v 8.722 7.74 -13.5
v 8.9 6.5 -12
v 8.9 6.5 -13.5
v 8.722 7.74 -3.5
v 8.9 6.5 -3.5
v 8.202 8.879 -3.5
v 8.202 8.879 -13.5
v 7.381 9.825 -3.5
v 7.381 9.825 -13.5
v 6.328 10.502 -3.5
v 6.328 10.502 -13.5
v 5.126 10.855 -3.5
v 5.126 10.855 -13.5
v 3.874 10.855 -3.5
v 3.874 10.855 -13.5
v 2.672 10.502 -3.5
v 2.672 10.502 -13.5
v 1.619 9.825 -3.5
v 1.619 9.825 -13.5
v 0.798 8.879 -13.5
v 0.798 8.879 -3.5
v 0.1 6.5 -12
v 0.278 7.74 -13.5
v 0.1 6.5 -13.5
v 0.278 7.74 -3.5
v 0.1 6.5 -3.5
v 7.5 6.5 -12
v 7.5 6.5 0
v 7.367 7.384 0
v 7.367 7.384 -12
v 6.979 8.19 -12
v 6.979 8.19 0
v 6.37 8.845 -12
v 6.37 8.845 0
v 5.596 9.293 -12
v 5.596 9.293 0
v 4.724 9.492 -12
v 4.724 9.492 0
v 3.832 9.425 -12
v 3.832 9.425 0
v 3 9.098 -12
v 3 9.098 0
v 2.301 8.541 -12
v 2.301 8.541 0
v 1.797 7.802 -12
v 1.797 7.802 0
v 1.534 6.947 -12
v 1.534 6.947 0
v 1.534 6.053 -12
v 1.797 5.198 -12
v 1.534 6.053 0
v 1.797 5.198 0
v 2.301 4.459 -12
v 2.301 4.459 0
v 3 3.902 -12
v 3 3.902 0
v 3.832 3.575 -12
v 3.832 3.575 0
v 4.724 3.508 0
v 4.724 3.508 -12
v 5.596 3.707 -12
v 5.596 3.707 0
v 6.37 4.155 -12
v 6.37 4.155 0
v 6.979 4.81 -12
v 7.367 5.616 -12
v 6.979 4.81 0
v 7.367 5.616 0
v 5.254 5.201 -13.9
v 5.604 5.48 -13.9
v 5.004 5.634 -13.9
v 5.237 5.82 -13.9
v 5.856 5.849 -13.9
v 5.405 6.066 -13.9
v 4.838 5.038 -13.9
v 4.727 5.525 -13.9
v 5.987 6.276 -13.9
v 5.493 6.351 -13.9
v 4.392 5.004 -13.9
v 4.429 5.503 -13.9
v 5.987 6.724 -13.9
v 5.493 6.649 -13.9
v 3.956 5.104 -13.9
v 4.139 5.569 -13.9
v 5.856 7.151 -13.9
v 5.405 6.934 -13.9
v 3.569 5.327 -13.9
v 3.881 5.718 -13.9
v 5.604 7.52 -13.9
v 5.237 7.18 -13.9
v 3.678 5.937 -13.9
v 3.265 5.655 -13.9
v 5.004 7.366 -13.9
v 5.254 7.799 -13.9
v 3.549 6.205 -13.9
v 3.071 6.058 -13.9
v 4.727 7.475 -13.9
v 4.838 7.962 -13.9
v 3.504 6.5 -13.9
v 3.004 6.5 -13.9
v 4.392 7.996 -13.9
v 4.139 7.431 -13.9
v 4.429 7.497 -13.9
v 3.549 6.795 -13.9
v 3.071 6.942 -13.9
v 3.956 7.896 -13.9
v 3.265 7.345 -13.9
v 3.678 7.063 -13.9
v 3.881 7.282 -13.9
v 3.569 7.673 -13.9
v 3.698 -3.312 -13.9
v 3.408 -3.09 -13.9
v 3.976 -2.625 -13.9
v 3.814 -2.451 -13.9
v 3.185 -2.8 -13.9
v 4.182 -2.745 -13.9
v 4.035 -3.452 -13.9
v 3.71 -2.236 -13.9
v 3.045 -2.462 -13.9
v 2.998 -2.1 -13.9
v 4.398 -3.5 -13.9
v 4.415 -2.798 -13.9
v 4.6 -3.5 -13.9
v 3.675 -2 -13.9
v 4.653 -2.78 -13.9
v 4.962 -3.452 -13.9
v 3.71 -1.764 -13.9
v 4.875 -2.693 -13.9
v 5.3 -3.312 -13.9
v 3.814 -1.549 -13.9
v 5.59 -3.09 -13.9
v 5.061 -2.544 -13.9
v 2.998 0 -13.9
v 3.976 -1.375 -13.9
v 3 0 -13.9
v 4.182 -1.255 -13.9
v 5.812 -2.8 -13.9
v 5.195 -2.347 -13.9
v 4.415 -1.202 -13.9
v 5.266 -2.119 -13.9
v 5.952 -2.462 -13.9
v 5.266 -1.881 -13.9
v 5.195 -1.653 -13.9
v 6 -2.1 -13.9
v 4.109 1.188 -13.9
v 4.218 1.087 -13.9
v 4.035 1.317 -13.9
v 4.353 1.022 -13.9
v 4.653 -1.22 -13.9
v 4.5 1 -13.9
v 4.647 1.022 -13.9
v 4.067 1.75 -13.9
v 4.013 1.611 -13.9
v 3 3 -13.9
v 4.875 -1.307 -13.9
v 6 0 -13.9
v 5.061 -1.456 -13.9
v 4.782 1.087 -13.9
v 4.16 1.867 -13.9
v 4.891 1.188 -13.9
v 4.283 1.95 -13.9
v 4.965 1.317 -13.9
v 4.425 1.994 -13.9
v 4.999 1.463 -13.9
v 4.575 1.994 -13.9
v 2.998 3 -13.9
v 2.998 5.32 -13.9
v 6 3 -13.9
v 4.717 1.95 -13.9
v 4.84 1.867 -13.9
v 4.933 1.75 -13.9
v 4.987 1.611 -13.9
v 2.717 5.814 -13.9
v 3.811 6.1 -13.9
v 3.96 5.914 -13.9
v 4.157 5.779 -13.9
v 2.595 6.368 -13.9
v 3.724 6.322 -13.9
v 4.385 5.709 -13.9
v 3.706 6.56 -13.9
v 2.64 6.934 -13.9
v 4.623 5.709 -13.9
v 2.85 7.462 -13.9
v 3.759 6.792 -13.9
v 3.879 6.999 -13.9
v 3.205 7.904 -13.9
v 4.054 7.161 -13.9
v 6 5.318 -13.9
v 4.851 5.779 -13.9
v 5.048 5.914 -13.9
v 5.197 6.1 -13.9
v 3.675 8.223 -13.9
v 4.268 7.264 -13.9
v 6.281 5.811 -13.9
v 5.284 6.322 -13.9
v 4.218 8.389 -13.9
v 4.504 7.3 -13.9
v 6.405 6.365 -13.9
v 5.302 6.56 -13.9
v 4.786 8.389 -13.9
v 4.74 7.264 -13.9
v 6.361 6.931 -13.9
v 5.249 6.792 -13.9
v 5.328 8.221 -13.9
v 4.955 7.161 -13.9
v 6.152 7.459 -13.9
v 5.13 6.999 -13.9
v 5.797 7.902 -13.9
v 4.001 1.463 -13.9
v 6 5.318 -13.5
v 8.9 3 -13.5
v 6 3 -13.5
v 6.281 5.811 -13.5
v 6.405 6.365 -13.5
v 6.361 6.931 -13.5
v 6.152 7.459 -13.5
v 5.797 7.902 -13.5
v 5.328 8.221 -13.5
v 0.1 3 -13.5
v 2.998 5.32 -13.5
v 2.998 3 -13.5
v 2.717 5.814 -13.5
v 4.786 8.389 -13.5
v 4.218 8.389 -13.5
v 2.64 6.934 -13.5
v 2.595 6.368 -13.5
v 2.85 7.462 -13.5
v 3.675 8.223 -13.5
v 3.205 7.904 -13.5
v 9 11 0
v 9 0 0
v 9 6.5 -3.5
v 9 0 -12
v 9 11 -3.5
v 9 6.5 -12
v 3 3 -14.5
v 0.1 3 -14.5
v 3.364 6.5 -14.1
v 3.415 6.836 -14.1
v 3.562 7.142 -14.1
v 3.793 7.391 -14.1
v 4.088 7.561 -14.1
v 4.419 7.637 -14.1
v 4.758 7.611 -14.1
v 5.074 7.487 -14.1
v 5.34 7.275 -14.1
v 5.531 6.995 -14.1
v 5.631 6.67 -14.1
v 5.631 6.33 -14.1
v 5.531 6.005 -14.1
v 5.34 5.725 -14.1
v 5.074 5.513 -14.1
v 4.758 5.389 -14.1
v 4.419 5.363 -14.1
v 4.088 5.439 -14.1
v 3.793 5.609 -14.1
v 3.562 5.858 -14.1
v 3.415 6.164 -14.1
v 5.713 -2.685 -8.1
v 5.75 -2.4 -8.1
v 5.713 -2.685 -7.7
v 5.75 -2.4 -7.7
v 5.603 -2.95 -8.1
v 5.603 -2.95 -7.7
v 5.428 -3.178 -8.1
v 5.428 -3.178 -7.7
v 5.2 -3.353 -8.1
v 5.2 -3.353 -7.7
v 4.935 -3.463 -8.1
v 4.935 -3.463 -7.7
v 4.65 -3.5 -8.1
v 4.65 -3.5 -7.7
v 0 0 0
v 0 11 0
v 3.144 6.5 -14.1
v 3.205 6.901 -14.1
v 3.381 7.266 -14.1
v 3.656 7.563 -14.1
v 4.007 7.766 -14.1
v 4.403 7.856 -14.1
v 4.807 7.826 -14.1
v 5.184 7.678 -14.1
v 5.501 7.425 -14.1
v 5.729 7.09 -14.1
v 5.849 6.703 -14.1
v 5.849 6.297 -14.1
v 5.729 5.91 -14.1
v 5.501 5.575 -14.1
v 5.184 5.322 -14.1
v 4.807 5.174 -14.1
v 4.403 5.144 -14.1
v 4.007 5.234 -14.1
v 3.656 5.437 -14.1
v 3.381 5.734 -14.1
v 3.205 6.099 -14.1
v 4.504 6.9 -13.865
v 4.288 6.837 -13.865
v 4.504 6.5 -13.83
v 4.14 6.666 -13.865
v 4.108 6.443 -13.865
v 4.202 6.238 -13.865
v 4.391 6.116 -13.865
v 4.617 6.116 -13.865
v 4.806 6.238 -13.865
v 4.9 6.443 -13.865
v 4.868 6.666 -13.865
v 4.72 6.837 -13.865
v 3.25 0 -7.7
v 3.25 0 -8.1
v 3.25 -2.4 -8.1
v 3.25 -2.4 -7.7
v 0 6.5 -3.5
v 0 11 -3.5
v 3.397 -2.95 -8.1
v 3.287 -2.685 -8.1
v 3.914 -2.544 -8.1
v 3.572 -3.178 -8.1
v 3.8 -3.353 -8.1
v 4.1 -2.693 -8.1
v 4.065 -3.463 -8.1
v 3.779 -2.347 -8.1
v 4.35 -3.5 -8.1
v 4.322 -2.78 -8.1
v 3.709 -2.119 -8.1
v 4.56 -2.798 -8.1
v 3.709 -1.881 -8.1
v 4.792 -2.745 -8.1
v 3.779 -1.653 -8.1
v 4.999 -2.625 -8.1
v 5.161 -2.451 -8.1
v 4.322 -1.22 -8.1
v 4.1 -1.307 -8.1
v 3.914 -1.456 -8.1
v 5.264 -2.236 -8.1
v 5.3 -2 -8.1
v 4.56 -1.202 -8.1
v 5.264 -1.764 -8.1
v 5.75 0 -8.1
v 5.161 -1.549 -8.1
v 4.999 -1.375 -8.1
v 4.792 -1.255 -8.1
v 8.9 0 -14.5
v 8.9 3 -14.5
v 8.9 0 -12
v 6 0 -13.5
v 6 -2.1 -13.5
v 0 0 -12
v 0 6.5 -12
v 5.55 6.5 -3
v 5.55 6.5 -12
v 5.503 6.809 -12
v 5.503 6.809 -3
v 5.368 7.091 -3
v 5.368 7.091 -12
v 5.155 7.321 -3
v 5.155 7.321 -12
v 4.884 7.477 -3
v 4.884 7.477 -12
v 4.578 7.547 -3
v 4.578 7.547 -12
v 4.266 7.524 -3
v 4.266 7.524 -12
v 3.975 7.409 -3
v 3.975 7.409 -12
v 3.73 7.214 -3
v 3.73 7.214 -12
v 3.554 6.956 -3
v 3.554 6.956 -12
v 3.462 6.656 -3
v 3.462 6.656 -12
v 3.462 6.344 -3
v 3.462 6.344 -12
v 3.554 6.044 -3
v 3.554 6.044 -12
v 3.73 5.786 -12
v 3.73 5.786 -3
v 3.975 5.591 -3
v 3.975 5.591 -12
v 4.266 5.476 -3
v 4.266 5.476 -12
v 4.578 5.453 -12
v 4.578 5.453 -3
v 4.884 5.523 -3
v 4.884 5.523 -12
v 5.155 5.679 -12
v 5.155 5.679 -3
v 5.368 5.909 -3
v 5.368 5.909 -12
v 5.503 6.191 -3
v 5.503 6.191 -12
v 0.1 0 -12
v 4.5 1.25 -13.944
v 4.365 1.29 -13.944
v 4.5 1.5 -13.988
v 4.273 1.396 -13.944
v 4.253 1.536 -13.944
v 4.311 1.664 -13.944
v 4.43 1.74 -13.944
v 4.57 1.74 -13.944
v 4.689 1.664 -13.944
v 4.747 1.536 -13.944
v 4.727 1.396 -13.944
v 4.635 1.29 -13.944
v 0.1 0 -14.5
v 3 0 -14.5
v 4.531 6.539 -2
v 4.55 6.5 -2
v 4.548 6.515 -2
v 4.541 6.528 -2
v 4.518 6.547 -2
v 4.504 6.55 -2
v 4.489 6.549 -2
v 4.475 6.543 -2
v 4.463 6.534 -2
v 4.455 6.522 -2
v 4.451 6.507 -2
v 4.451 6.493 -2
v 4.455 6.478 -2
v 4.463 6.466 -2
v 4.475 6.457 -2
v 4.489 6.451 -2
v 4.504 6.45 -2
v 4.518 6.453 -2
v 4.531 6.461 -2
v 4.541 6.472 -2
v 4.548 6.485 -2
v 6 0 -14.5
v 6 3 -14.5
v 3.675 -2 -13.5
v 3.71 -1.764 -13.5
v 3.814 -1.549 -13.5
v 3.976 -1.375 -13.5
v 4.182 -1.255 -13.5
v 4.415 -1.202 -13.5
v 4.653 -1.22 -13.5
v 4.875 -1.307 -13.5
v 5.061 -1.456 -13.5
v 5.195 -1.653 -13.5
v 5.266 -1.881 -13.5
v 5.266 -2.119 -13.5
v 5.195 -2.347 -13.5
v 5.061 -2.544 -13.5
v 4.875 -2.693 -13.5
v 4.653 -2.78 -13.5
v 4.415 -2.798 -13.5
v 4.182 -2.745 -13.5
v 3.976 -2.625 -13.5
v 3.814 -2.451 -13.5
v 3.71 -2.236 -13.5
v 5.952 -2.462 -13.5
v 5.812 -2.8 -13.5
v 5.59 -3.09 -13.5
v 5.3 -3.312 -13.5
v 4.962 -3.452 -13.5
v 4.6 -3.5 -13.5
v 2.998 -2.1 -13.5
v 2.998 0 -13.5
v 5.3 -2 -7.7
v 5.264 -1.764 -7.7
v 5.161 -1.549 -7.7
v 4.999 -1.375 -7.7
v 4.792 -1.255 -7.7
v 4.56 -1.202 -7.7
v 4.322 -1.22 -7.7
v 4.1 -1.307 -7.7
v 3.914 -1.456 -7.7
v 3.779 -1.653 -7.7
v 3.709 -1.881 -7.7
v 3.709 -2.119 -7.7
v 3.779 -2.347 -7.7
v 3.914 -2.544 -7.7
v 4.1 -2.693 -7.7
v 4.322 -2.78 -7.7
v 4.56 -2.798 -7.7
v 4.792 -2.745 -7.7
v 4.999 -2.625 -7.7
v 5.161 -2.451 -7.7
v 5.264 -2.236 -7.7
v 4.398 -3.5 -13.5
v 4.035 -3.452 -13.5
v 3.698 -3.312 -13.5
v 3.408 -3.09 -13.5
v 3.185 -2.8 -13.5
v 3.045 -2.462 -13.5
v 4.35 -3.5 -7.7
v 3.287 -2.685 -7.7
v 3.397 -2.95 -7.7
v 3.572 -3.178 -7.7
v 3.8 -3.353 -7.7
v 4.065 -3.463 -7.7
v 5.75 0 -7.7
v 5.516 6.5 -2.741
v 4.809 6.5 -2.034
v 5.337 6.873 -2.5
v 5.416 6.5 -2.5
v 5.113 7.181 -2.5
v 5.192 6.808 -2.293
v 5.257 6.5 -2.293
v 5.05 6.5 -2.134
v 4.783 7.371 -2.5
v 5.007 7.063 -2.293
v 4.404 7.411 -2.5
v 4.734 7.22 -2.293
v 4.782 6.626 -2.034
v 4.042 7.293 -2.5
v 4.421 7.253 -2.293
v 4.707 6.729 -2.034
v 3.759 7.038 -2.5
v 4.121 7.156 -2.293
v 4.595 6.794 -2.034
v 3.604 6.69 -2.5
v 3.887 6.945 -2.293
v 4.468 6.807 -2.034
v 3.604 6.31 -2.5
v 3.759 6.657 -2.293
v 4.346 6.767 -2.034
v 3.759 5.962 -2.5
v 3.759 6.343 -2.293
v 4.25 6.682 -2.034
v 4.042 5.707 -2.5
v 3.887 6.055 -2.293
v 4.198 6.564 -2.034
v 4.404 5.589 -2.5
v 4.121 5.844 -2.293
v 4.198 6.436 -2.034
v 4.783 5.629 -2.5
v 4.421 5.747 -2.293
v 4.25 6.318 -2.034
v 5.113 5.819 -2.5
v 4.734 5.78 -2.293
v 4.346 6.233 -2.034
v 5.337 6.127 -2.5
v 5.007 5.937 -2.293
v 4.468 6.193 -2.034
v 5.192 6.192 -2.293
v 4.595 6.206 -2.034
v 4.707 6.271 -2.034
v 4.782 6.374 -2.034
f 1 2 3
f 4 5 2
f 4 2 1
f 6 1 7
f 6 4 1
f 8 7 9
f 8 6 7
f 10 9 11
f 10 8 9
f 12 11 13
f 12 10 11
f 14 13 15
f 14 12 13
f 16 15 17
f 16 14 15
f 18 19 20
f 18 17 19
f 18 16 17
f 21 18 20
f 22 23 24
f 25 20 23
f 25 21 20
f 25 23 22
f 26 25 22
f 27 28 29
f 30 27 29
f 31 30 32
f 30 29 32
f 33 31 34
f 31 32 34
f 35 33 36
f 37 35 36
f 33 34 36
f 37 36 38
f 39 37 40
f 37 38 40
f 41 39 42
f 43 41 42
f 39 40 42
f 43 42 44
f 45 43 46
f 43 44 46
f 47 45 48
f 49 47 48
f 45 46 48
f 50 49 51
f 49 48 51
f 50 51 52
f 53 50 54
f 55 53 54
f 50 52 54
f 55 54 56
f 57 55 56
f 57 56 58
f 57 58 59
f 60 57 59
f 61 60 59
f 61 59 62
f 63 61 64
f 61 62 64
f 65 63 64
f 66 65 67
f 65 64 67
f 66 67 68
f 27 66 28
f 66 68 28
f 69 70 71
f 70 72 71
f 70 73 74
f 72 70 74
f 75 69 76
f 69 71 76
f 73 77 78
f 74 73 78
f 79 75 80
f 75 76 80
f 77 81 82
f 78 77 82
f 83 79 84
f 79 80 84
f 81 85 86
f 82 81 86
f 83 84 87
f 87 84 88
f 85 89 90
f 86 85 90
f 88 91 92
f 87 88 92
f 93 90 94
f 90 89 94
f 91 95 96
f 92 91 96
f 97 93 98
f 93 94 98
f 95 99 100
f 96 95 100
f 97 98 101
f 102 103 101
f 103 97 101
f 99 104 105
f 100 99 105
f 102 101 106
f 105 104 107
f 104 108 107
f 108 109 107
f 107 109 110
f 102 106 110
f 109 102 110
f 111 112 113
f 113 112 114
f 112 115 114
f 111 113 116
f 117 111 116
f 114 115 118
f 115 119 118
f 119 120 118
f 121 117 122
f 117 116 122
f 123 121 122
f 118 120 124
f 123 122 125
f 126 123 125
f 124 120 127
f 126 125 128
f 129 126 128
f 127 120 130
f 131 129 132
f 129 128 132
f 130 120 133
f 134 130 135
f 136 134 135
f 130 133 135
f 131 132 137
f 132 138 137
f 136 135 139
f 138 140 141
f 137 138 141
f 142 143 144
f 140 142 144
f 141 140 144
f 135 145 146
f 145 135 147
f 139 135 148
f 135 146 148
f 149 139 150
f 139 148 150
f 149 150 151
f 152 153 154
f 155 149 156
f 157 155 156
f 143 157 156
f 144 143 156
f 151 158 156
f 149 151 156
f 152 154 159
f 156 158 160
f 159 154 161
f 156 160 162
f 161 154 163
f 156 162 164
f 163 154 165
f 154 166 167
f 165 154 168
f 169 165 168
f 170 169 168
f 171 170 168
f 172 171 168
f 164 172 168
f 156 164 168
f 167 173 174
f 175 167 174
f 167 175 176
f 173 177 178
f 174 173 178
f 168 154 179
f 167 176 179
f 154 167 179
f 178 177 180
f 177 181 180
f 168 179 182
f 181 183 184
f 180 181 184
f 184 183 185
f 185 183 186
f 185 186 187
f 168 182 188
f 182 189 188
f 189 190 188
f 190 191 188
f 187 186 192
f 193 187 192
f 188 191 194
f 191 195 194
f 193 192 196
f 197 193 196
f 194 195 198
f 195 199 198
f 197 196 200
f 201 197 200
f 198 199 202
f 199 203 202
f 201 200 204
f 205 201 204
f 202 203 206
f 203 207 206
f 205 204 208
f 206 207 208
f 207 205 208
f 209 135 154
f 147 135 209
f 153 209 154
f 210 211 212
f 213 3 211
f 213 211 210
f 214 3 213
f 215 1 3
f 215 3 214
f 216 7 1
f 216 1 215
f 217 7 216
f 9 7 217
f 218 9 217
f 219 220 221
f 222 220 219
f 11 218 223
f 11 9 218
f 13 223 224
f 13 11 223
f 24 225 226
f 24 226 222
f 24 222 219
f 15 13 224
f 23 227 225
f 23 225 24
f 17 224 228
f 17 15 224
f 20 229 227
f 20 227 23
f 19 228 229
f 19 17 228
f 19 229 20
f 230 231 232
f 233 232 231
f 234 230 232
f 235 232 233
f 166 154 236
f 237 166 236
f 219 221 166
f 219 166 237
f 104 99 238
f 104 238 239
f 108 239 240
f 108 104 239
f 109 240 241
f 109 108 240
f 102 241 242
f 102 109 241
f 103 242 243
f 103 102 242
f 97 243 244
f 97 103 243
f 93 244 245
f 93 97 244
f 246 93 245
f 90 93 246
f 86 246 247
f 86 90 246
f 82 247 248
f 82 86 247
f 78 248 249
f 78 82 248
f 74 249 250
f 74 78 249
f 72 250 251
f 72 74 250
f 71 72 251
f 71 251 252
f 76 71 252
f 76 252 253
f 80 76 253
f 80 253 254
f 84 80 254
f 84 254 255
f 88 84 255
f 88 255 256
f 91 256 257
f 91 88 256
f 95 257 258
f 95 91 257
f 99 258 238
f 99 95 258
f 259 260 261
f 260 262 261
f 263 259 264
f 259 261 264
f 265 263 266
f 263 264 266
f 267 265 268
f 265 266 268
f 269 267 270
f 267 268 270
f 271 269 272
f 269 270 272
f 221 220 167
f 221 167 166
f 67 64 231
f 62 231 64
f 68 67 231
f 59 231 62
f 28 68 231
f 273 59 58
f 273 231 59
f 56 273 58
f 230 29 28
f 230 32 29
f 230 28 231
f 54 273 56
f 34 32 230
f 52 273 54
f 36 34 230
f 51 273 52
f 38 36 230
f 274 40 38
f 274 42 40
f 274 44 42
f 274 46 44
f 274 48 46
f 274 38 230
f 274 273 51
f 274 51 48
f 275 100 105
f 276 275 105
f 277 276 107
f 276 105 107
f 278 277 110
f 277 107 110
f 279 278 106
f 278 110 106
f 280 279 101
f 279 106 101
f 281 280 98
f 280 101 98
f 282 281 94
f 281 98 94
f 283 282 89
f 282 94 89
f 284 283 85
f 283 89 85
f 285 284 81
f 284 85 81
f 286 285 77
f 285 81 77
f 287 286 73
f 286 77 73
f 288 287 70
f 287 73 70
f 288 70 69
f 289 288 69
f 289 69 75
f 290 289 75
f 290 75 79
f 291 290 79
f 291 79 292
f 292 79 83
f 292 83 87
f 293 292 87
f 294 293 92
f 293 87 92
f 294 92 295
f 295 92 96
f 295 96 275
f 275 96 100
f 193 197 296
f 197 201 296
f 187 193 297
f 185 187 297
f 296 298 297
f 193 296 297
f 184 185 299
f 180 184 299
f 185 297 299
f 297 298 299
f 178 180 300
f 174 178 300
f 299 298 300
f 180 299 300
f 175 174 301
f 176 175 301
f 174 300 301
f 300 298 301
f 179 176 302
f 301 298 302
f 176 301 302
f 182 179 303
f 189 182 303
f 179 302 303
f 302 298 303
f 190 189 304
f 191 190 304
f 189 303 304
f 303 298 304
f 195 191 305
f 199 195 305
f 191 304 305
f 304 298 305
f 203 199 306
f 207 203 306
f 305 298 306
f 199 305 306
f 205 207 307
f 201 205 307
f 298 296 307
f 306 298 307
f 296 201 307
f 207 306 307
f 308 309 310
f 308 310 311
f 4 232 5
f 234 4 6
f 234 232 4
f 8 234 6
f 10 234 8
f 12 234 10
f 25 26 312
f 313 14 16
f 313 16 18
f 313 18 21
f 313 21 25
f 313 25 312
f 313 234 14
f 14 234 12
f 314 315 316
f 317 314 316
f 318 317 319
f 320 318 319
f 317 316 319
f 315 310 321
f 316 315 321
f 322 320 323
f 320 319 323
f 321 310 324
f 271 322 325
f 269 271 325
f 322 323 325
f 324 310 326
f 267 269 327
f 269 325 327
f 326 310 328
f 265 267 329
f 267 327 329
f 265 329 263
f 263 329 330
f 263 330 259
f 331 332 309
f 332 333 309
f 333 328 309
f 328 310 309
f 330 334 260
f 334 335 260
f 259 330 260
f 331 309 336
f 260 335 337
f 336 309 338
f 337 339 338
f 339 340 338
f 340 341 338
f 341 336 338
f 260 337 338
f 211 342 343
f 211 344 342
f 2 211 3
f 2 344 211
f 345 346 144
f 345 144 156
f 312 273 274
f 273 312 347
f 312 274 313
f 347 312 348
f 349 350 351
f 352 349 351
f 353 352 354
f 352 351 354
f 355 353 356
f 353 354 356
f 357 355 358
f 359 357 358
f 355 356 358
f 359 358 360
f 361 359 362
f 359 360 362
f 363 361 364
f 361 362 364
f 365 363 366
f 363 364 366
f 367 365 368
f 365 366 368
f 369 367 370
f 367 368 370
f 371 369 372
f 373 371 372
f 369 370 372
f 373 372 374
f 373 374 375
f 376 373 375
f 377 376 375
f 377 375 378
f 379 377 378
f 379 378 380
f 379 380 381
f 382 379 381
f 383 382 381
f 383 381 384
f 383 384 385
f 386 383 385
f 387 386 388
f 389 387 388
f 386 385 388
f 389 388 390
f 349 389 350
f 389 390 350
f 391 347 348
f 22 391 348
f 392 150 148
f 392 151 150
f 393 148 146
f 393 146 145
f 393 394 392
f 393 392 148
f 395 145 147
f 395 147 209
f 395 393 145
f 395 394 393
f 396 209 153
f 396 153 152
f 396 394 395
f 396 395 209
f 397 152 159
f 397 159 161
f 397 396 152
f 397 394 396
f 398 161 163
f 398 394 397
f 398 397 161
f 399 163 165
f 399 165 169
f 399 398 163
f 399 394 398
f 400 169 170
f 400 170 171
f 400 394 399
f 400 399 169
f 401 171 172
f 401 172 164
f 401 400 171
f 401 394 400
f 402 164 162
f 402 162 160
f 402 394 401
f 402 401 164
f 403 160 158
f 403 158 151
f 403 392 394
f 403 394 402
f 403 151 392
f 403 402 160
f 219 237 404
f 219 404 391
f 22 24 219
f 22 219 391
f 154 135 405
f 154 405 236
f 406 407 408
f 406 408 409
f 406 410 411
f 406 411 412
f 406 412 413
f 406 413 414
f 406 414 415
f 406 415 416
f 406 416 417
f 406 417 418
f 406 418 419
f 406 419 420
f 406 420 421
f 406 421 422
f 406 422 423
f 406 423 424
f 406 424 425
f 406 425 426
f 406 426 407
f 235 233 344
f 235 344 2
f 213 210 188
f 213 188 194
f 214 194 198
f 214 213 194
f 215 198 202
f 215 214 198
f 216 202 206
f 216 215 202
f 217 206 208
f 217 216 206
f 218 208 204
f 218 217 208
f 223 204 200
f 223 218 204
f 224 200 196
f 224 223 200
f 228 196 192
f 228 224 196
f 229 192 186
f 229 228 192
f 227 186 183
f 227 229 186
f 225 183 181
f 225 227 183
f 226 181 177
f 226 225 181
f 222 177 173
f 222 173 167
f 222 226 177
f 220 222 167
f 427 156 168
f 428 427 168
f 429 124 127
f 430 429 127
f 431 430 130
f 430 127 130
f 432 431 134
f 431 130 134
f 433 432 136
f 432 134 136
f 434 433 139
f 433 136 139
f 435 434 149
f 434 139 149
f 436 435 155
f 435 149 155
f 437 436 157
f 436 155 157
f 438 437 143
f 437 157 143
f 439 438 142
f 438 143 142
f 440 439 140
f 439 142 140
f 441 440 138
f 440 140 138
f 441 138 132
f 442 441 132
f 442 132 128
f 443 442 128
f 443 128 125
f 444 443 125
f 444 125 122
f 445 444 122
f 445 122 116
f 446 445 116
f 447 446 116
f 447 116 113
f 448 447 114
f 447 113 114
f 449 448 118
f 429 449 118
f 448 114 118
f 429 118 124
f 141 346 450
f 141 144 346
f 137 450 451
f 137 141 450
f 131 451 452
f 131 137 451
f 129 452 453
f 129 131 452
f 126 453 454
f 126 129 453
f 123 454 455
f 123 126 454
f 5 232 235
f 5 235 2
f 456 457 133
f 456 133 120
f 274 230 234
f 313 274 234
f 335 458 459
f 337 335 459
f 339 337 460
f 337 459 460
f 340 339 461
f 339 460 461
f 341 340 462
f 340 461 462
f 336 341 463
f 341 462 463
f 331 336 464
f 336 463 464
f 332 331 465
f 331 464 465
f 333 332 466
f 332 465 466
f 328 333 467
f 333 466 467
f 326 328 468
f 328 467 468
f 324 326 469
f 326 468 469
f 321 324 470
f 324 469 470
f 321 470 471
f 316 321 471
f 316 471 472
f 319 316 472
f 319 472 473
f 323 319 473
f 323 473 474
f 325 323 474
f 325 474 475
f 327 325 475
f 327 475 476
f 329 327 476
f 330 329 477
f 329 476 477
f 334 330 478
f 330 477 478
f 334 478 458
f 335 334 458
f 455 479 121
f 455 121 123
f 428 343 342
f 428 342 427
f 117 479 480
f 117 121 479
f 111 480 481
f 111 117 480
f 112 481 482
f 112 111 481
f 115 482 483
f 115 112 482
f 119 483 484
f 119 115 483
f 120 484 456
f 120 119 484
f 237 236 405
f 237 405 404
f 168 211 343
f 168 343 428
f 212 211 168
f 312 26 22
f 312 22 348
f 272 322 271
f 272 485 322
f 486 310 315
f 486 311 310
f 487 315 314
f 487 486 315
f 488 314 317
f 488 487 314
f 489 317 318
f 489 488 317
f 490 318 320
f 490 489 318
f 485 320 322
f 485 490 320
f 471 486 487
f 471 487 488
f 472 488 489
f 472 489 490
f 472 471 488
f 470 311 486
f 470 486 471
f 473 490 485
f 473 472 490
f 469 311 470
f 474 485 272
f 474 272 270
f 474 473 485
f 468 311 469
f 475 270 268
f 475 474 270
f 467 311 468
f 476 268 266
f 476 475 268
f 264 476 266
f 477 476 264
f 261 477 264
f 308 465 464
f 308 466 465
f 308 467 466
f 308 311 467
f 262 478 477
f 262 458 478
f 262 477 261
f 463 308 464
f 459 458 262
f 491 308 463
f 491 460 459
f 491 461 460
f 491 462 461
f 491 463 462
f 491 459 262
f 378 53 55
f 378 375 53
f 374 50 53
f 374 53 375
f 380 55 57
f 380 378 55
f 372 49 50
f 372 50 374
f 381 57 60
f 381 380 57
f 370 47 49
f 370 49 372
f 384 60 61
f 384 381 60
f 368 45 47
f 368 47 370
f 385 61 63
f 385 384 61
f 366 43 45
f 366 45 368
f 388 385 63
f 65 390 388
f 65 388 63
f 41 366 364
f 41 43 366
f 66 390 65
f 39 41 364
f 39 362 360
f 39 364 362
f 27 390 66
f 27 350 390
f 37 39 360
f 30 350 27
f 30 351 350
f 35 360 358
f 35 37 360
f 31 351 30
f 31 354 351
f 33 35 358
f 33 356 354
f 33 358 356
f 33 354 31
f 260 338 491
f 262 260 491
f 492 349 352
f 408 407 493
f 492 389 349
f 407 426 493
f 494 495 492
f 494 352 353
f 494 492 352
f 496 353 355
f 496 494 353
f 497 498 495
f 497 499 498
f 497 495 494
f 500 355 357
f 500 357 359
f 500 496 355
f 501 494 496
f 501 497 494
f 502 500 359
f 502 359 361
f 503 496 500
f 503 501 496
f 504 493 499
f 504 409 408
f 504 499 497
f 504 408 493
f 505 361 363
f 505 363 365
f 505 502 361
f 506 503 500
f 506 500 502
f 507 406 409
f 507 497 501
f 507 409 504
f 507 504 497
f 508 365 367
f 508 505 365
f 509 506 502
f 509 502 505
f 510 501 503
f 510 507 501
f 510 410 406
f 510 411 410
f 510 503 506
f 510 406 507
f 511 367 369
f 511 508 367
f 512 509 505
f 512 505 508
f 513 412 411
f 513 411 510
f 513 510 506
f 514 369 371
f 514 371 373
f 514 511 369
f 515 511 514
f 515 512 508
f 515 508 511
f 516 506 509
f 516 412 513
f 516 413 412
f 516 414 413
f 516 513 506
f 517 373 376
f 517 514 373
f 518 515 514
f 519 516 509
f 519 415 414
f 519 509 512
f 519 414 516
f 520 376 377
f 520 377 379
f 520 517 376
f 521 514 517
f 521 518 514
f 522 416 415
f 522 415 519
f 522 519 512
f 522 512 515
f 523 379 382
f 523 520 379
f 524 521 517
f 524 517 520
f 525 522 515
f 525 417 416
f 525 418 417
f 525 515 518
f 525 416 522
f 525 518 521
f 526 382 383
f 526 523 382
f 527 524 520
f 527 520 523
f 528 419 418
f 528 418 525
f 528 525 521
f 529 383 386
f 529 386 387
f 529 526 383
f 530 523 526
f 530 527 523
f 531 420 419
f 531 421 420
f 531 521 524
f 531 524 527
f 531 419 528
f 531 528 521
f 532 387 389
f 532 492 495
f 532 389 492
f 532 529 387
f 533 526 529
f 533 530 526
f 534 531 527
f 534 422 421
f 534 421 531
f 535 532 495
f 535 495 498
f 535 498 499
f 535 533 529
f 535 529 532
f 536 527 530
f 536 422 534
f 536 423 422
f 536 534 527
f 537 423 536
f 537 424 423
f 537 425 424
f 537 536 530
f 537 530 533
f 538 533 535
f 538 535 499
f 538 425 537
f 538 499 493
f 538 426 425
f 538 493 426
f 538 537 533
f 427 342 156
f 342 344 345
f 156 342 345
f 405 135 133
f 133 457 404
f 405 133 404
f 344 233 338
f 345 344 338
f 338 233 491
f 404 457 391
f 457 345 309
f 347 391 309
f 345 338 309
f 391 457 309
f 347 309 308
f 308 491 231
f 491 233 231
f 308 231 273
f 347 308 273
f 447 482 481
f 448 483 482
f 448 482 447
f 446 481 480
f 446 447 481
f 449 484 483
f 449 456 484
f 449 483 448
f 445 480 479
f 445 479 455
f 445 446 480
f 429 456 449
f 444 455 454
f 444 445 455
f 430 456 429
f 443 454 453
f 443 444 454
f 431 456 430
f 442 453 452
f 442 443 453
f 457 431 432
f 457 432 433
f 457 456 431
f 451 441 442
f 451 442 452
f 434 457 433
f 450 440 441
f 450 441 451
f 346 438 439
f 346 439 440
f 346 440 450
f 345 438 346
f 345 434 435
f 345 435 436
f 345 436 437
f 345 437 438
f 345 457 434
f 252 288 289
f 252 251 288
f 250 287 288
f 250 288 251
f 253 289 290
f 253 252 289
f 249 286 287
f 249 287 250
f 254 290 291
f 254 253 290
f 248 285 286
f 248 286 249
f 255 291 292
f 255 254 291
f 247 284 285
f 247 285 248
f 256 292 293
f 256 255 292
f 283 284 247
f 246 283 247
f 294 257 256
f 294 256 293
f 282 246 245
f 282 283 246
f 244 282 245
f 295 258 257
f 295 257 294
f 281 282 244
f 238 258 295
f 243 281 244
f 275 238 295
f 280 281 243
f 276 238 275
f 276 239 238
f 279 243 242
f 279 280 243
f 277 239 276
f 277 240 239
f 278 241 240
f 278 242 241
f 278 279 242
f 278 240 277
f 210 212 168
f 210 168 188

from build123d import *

# Parameters (mm, degrees)
SKETCH1_W               = 14.5
SKETCH1_H               = 11
BOSS_EXTRUDE1_DEPTH     = 9
CUT_EXTRUDE1_DEPTH      = 21.303940504
CUT_EXTRUDE1_DEPTH_BACK = 11
SKETCH5_W               = 2.5
SKETCH5_H               = 6.5
CUT_EXTRUDE2_DEPTH      = 0.1
SKETCH6_W               = 2.5
SKETCH6_H               = 6.5
CUT_EXTRUDE3_DEPTH      = 0.1
CUT_EXTRUDE4_START      = -1
CUT_EXTRUDE4_DEPTH      = 1
SKETCH8_W               = 2.9
SKETCH8_H               = 3
BOSS_EXTRUDE2_DEPTH     = 1
SKETCH9_R               = 3
CUT_EXTRUDE5_DEPTH      = 12
BOSS_EXTRUDE4_DEPTH     = 0.4
FILLET1_R               = 1.4
SKETCH12_R              = 0.8
CUT_EXTRUDE6_DEPTH      = 0.4
SKETCH13_R              = 1.5
SKETCH13_R_2            = 1
BOSS_EXTRUDE6_DEPTH     = 0.2
BOSS_EXTRUDE6_DRAFT     = 35
SKETCH16_W              = 2.5
SKETCH16_H              = 0.4
BOSS_EXTRUDE7_DEPTH     = 3.5
SKETCH18_R              = 0.8
CUT_EXTRUDE8_DEPTH      = 0.4
FILLET2_R               = 1.1
SKETCH19_R              = 1.05
BOSS_EXTRUDE8_DEPTH     = 10
FILLET3_R               = 1


with BuildPart() as part:
    # Sketch1 → Boss-Extrude1 (new body)
    with BuildSketch(Plane(origin=(0, 0, 0), x_dir=(0, 0, -1), z_dir=(1, 0, 0))):
        with Locations((7.25, 5.5)):
            Rectangle(SKETCH1_W, SKETCH1_H)
    extrude(amount=BOSS_EXTRUDE1_DEPTH)

    # Sketch2 → Cut-Extrude1 (cut, two sides: drawn at the far end of the back side and taken through both)
    with BuildSketch(Plane(origin=(0, 0, -14.5), x_dir=(-1, 0, 0), z_dir=(0, 0, -1)).offset(-CUT_EXTRUDE1_DEPTH_BACK)):
        with BuildLine():
            Line((-9, 6.5), (-8.9, 6.5))
            ThreePointArc((-8.9, 6.5), (-4.5, 10.9), (-0.1, 6.5))
            Line((-0.1, 6.5), (0, 6.5))
            Line((0, 6.5), (0, 11))
            Line((0, 11), (-9, 11))
            Line((-9, 11), (-9, 6.5))
        make_face()
    extrude(amount=CUT_EXTRUDE1_DEPTH + CUT_EXTRUDE1_DEPTH_BACK, mode=Mode.SUBTRACT)

    # Sketch5 → Cut-Extrude2 (cut)
    with BuildSketch(Plane.ZY):
        with Locations((-13.25, 3.25)):
            Rectangle(SKETCH5_W, SKETCH5_H)
    extrude(amount=-CUT_EXTRUDE2_DEPTH, mode=Mode.SUBTRACT)

    # Sketch6 → Cut-Extrude3 (cut)
    with BuildSketch(Plane(origin=(9, 0, 0), x_dir=(0, 0, -1), z_dir=(1, 0, 0))):
        with Locations((13.25, 3.25)):
            Rectangle(SKETCH6_W, SKETCH6_H)
    extrude(amount=-CUT_EXTRUDE3_DEPTH, mode=Mode.SUBTRACT)

    # Sketch7 → Cut-Extrude4 (cut)
    with BuildSketch(Plane(origin=(0, 0, -14.5), x_dir=(-1, 0, 0), z_dir=(0, 0, -1)).offset(CUT_EXTRUDE4_START)):
        with BuildLine():
            Line((-8.9, 6.5), (-8.9, 0))
            Line((-8.9, 0), (-0.1, 0))
            Line((-0.1, 0), (-0.1, 6.5))
            ThreePointArc((-0.1, 6.5), (-4.5, 10.9), (-8.9, 6.5))
        make_face()
    extrude(amount=CUT_EXTRUDE4_DEPTH, mode=Mode.SUBTRACT)

    # Sketch8 → Boss-Extrude2 (add)
    with BuildSketch(Plane(origin=(0, 0, -13.5), x_dir=(-1, 0, 0), z_dir=(0, 0, -1))):
        with Locations((-7.45, 1.5)):
            Rectangle(SKETCH8_W, SKETCH8_H)
        with Locations((-1.55, 1.5)):
            Rectangle(SKETCH8_W, SKETCH8_H)
    extrude(amount=BOSS_EXTRUDE2_DEPTH)

    # Sketch9 → Cut-Extrude5 (cut)
    with BuildSketch(Plane.XY):
        with Locations((4.5, 6.5)):
            Circle(SKETCH9_R)
    extrude(amount=-CUT_EXTRUDE5_DEPTH, mode=Mode.SUBTRACT)



with BuildPart() as body_2:
    # Sketch10 → Boss-Extrude4 (new body)
    with BuildSketch(Plane(origin=(0, 0, -13.5), x_dir=(-1, 0, 0), z_dir=(0, 0, -1))):
        with BuildLine():
            Line((-6, 0), (-6, 5.317587213))
            ThreePointArc((-6, 5.317587213), (-4.501820172, 8.409999133), (-2.997749118, 5.320448268))
            Line((-2.997749118, 5.320448268), (-2.997749118, 0))
            Line((-2.997749118, 0), (-2.997749118, -3.5))
            Line((-2.997749118, -3.5), (-6, -3.5))
            Line((-6, -3.5), (-6, 0))
        make_face()
    extrude(amount=BOSS_EXTRUDE4_DEPTH)


with BuildPart() as part_1:
    add(part.part)

    add(body_2.part)  # Boss-Extrude5 merges body 2
    # Boss-Extrude5 cone 1 section (through the dimple's axis) → Boss-Extrude5 (revolve)
    with BuildSketch(Plane(origin=(4.5, 1.5, -13.9), x_dir=(0, -1, 0), z_dir=(1, 0, 0))):
        Polygon((0, 0), (0.5, 0), (0, 0.08816349), align=None)
    revolve(axis=Axis((4.5, 1.5, -13.9), (0, 0, -1)))

    # Fillet1
    fillet1_edges = [part_1.edges().sort_by_distance(p)[0] for p in [
        (2.997749118, -3.5, -13.7),
        (6, -3.5, -13.7),
    ]]
    fillet(fillet1_edges, radius=FILLET1_R)

    # Sketch12 → Cut-Extrude6 (cut)
    with BuildSketch(Plane(origin=(0, 0, -13.9), x_dir=(-1, 0, 0), z_dir=(0, 0, -1))):
        with Locations((-4.474664636, -2)):
            Circle(SKETCH12_R)
    extrude(amount=-CUT_EXTRUDE6_DEPTH, mode=Mode.SUBTRACT)

    # Cut-Extrude7 cone 1 section (through the dimple's axis) → Cut-Extrude7 (revolve, cut)
    with BuildSketch(Plane(origin=(4.504178443, 6.5, -13.9), x_dir=(0, 1, 0), z_dir=(1, 0, 0))):
        Polygon((0, 0), (0.8, 0), (0, 0.069990931), align=None)
    revolve(axis=Axis((4.504178443, 6.5, -13.9), (0, 0, 1)), mode=Mode.SUBTRACT)

    # Sketch16 → Boss-Extrude7 (add)
    with BuildSketch(Plane.XZ):
        with Locations((4.5, -7.9)):
            Rectangle(SKETCH16_W, SKETCH16_H)
    extrude(amount=BOSS_EXTRUDE7_DEPTH)

    # Sketch18 → Cut-Extrude8 (cut)
    with BuildSketch(Plane.XY.offset(-7.7)):
        with Locations((4.5, -2)):
            Circle(SKETCH18_R)
    extrude(amount=-CUT_EXTRUDE8_DEPTH, mode=Mode.SUBTRACT)

    # Fillet2
    fillet2_edges = [part_1.edges().sort_by_distance(p)[0] for p in [
        (3.25, -3.5, -7.9),
        (5.75, -3.5, -7.9),
    ]]
    fillet(fillet2_edges, radius=FILLET2_R)

    # Sketch19 → Boss-Extrude8 (add)
    with BuildSketch(Plane.XY.offset(-12)):
        with Locations((4.5, 6.5)):
            Circle(SKETCH19_R)
    extrude(amount=BOSS_EXTRUDE8_DEPTH)

    # Fillet3
    fillet3_edges = [part_1.edges().sort_by_distance(p)[0] for p in [
        (3.45, 6.5, -2),
    ]]
    fillet(fillet3_edges, radius=FILLET3_R)


with BuildPart() as body_2_2:
    # Sketch13 → Boss-Extrude6 (with draft: the straight prism first)
    with BuildSketch(Plane(origin=(0, 0, -13.9), x_dir=(-1, 0, 0), z_dir=(0, 0, -1))):
        with Locations((-4.504178443, 6.5)):
            Circle(SKETCH13_R)
        with Locations((-4.504178443, 6.5)):
            Circle(SKETCH13_R_2, mode=Mode.SUBTRACT)
    extrude(amount=BOSS_EXTRUDE6_DEPTH)
    # Boss-Extrude6: the draft: its side faces are tilted about the plane it starts from
    boss_extrude6_sides = [body_2_2.faces().sort_by_distance(p)[0] for p in [
        (6.004178443, 6.5, -14),
        (5.504178443, 6.5, -14),
    ]]
    draft(boss_extrude6_sides, Plane(origin=(0, 0, -13.9), x_dir=(-1, 0, 0), z_dir=(0, 0, -1)), BOSS_EXTRUDE6_DRAFT)


solid = Compound([part_1.part, body_2_2.part])
